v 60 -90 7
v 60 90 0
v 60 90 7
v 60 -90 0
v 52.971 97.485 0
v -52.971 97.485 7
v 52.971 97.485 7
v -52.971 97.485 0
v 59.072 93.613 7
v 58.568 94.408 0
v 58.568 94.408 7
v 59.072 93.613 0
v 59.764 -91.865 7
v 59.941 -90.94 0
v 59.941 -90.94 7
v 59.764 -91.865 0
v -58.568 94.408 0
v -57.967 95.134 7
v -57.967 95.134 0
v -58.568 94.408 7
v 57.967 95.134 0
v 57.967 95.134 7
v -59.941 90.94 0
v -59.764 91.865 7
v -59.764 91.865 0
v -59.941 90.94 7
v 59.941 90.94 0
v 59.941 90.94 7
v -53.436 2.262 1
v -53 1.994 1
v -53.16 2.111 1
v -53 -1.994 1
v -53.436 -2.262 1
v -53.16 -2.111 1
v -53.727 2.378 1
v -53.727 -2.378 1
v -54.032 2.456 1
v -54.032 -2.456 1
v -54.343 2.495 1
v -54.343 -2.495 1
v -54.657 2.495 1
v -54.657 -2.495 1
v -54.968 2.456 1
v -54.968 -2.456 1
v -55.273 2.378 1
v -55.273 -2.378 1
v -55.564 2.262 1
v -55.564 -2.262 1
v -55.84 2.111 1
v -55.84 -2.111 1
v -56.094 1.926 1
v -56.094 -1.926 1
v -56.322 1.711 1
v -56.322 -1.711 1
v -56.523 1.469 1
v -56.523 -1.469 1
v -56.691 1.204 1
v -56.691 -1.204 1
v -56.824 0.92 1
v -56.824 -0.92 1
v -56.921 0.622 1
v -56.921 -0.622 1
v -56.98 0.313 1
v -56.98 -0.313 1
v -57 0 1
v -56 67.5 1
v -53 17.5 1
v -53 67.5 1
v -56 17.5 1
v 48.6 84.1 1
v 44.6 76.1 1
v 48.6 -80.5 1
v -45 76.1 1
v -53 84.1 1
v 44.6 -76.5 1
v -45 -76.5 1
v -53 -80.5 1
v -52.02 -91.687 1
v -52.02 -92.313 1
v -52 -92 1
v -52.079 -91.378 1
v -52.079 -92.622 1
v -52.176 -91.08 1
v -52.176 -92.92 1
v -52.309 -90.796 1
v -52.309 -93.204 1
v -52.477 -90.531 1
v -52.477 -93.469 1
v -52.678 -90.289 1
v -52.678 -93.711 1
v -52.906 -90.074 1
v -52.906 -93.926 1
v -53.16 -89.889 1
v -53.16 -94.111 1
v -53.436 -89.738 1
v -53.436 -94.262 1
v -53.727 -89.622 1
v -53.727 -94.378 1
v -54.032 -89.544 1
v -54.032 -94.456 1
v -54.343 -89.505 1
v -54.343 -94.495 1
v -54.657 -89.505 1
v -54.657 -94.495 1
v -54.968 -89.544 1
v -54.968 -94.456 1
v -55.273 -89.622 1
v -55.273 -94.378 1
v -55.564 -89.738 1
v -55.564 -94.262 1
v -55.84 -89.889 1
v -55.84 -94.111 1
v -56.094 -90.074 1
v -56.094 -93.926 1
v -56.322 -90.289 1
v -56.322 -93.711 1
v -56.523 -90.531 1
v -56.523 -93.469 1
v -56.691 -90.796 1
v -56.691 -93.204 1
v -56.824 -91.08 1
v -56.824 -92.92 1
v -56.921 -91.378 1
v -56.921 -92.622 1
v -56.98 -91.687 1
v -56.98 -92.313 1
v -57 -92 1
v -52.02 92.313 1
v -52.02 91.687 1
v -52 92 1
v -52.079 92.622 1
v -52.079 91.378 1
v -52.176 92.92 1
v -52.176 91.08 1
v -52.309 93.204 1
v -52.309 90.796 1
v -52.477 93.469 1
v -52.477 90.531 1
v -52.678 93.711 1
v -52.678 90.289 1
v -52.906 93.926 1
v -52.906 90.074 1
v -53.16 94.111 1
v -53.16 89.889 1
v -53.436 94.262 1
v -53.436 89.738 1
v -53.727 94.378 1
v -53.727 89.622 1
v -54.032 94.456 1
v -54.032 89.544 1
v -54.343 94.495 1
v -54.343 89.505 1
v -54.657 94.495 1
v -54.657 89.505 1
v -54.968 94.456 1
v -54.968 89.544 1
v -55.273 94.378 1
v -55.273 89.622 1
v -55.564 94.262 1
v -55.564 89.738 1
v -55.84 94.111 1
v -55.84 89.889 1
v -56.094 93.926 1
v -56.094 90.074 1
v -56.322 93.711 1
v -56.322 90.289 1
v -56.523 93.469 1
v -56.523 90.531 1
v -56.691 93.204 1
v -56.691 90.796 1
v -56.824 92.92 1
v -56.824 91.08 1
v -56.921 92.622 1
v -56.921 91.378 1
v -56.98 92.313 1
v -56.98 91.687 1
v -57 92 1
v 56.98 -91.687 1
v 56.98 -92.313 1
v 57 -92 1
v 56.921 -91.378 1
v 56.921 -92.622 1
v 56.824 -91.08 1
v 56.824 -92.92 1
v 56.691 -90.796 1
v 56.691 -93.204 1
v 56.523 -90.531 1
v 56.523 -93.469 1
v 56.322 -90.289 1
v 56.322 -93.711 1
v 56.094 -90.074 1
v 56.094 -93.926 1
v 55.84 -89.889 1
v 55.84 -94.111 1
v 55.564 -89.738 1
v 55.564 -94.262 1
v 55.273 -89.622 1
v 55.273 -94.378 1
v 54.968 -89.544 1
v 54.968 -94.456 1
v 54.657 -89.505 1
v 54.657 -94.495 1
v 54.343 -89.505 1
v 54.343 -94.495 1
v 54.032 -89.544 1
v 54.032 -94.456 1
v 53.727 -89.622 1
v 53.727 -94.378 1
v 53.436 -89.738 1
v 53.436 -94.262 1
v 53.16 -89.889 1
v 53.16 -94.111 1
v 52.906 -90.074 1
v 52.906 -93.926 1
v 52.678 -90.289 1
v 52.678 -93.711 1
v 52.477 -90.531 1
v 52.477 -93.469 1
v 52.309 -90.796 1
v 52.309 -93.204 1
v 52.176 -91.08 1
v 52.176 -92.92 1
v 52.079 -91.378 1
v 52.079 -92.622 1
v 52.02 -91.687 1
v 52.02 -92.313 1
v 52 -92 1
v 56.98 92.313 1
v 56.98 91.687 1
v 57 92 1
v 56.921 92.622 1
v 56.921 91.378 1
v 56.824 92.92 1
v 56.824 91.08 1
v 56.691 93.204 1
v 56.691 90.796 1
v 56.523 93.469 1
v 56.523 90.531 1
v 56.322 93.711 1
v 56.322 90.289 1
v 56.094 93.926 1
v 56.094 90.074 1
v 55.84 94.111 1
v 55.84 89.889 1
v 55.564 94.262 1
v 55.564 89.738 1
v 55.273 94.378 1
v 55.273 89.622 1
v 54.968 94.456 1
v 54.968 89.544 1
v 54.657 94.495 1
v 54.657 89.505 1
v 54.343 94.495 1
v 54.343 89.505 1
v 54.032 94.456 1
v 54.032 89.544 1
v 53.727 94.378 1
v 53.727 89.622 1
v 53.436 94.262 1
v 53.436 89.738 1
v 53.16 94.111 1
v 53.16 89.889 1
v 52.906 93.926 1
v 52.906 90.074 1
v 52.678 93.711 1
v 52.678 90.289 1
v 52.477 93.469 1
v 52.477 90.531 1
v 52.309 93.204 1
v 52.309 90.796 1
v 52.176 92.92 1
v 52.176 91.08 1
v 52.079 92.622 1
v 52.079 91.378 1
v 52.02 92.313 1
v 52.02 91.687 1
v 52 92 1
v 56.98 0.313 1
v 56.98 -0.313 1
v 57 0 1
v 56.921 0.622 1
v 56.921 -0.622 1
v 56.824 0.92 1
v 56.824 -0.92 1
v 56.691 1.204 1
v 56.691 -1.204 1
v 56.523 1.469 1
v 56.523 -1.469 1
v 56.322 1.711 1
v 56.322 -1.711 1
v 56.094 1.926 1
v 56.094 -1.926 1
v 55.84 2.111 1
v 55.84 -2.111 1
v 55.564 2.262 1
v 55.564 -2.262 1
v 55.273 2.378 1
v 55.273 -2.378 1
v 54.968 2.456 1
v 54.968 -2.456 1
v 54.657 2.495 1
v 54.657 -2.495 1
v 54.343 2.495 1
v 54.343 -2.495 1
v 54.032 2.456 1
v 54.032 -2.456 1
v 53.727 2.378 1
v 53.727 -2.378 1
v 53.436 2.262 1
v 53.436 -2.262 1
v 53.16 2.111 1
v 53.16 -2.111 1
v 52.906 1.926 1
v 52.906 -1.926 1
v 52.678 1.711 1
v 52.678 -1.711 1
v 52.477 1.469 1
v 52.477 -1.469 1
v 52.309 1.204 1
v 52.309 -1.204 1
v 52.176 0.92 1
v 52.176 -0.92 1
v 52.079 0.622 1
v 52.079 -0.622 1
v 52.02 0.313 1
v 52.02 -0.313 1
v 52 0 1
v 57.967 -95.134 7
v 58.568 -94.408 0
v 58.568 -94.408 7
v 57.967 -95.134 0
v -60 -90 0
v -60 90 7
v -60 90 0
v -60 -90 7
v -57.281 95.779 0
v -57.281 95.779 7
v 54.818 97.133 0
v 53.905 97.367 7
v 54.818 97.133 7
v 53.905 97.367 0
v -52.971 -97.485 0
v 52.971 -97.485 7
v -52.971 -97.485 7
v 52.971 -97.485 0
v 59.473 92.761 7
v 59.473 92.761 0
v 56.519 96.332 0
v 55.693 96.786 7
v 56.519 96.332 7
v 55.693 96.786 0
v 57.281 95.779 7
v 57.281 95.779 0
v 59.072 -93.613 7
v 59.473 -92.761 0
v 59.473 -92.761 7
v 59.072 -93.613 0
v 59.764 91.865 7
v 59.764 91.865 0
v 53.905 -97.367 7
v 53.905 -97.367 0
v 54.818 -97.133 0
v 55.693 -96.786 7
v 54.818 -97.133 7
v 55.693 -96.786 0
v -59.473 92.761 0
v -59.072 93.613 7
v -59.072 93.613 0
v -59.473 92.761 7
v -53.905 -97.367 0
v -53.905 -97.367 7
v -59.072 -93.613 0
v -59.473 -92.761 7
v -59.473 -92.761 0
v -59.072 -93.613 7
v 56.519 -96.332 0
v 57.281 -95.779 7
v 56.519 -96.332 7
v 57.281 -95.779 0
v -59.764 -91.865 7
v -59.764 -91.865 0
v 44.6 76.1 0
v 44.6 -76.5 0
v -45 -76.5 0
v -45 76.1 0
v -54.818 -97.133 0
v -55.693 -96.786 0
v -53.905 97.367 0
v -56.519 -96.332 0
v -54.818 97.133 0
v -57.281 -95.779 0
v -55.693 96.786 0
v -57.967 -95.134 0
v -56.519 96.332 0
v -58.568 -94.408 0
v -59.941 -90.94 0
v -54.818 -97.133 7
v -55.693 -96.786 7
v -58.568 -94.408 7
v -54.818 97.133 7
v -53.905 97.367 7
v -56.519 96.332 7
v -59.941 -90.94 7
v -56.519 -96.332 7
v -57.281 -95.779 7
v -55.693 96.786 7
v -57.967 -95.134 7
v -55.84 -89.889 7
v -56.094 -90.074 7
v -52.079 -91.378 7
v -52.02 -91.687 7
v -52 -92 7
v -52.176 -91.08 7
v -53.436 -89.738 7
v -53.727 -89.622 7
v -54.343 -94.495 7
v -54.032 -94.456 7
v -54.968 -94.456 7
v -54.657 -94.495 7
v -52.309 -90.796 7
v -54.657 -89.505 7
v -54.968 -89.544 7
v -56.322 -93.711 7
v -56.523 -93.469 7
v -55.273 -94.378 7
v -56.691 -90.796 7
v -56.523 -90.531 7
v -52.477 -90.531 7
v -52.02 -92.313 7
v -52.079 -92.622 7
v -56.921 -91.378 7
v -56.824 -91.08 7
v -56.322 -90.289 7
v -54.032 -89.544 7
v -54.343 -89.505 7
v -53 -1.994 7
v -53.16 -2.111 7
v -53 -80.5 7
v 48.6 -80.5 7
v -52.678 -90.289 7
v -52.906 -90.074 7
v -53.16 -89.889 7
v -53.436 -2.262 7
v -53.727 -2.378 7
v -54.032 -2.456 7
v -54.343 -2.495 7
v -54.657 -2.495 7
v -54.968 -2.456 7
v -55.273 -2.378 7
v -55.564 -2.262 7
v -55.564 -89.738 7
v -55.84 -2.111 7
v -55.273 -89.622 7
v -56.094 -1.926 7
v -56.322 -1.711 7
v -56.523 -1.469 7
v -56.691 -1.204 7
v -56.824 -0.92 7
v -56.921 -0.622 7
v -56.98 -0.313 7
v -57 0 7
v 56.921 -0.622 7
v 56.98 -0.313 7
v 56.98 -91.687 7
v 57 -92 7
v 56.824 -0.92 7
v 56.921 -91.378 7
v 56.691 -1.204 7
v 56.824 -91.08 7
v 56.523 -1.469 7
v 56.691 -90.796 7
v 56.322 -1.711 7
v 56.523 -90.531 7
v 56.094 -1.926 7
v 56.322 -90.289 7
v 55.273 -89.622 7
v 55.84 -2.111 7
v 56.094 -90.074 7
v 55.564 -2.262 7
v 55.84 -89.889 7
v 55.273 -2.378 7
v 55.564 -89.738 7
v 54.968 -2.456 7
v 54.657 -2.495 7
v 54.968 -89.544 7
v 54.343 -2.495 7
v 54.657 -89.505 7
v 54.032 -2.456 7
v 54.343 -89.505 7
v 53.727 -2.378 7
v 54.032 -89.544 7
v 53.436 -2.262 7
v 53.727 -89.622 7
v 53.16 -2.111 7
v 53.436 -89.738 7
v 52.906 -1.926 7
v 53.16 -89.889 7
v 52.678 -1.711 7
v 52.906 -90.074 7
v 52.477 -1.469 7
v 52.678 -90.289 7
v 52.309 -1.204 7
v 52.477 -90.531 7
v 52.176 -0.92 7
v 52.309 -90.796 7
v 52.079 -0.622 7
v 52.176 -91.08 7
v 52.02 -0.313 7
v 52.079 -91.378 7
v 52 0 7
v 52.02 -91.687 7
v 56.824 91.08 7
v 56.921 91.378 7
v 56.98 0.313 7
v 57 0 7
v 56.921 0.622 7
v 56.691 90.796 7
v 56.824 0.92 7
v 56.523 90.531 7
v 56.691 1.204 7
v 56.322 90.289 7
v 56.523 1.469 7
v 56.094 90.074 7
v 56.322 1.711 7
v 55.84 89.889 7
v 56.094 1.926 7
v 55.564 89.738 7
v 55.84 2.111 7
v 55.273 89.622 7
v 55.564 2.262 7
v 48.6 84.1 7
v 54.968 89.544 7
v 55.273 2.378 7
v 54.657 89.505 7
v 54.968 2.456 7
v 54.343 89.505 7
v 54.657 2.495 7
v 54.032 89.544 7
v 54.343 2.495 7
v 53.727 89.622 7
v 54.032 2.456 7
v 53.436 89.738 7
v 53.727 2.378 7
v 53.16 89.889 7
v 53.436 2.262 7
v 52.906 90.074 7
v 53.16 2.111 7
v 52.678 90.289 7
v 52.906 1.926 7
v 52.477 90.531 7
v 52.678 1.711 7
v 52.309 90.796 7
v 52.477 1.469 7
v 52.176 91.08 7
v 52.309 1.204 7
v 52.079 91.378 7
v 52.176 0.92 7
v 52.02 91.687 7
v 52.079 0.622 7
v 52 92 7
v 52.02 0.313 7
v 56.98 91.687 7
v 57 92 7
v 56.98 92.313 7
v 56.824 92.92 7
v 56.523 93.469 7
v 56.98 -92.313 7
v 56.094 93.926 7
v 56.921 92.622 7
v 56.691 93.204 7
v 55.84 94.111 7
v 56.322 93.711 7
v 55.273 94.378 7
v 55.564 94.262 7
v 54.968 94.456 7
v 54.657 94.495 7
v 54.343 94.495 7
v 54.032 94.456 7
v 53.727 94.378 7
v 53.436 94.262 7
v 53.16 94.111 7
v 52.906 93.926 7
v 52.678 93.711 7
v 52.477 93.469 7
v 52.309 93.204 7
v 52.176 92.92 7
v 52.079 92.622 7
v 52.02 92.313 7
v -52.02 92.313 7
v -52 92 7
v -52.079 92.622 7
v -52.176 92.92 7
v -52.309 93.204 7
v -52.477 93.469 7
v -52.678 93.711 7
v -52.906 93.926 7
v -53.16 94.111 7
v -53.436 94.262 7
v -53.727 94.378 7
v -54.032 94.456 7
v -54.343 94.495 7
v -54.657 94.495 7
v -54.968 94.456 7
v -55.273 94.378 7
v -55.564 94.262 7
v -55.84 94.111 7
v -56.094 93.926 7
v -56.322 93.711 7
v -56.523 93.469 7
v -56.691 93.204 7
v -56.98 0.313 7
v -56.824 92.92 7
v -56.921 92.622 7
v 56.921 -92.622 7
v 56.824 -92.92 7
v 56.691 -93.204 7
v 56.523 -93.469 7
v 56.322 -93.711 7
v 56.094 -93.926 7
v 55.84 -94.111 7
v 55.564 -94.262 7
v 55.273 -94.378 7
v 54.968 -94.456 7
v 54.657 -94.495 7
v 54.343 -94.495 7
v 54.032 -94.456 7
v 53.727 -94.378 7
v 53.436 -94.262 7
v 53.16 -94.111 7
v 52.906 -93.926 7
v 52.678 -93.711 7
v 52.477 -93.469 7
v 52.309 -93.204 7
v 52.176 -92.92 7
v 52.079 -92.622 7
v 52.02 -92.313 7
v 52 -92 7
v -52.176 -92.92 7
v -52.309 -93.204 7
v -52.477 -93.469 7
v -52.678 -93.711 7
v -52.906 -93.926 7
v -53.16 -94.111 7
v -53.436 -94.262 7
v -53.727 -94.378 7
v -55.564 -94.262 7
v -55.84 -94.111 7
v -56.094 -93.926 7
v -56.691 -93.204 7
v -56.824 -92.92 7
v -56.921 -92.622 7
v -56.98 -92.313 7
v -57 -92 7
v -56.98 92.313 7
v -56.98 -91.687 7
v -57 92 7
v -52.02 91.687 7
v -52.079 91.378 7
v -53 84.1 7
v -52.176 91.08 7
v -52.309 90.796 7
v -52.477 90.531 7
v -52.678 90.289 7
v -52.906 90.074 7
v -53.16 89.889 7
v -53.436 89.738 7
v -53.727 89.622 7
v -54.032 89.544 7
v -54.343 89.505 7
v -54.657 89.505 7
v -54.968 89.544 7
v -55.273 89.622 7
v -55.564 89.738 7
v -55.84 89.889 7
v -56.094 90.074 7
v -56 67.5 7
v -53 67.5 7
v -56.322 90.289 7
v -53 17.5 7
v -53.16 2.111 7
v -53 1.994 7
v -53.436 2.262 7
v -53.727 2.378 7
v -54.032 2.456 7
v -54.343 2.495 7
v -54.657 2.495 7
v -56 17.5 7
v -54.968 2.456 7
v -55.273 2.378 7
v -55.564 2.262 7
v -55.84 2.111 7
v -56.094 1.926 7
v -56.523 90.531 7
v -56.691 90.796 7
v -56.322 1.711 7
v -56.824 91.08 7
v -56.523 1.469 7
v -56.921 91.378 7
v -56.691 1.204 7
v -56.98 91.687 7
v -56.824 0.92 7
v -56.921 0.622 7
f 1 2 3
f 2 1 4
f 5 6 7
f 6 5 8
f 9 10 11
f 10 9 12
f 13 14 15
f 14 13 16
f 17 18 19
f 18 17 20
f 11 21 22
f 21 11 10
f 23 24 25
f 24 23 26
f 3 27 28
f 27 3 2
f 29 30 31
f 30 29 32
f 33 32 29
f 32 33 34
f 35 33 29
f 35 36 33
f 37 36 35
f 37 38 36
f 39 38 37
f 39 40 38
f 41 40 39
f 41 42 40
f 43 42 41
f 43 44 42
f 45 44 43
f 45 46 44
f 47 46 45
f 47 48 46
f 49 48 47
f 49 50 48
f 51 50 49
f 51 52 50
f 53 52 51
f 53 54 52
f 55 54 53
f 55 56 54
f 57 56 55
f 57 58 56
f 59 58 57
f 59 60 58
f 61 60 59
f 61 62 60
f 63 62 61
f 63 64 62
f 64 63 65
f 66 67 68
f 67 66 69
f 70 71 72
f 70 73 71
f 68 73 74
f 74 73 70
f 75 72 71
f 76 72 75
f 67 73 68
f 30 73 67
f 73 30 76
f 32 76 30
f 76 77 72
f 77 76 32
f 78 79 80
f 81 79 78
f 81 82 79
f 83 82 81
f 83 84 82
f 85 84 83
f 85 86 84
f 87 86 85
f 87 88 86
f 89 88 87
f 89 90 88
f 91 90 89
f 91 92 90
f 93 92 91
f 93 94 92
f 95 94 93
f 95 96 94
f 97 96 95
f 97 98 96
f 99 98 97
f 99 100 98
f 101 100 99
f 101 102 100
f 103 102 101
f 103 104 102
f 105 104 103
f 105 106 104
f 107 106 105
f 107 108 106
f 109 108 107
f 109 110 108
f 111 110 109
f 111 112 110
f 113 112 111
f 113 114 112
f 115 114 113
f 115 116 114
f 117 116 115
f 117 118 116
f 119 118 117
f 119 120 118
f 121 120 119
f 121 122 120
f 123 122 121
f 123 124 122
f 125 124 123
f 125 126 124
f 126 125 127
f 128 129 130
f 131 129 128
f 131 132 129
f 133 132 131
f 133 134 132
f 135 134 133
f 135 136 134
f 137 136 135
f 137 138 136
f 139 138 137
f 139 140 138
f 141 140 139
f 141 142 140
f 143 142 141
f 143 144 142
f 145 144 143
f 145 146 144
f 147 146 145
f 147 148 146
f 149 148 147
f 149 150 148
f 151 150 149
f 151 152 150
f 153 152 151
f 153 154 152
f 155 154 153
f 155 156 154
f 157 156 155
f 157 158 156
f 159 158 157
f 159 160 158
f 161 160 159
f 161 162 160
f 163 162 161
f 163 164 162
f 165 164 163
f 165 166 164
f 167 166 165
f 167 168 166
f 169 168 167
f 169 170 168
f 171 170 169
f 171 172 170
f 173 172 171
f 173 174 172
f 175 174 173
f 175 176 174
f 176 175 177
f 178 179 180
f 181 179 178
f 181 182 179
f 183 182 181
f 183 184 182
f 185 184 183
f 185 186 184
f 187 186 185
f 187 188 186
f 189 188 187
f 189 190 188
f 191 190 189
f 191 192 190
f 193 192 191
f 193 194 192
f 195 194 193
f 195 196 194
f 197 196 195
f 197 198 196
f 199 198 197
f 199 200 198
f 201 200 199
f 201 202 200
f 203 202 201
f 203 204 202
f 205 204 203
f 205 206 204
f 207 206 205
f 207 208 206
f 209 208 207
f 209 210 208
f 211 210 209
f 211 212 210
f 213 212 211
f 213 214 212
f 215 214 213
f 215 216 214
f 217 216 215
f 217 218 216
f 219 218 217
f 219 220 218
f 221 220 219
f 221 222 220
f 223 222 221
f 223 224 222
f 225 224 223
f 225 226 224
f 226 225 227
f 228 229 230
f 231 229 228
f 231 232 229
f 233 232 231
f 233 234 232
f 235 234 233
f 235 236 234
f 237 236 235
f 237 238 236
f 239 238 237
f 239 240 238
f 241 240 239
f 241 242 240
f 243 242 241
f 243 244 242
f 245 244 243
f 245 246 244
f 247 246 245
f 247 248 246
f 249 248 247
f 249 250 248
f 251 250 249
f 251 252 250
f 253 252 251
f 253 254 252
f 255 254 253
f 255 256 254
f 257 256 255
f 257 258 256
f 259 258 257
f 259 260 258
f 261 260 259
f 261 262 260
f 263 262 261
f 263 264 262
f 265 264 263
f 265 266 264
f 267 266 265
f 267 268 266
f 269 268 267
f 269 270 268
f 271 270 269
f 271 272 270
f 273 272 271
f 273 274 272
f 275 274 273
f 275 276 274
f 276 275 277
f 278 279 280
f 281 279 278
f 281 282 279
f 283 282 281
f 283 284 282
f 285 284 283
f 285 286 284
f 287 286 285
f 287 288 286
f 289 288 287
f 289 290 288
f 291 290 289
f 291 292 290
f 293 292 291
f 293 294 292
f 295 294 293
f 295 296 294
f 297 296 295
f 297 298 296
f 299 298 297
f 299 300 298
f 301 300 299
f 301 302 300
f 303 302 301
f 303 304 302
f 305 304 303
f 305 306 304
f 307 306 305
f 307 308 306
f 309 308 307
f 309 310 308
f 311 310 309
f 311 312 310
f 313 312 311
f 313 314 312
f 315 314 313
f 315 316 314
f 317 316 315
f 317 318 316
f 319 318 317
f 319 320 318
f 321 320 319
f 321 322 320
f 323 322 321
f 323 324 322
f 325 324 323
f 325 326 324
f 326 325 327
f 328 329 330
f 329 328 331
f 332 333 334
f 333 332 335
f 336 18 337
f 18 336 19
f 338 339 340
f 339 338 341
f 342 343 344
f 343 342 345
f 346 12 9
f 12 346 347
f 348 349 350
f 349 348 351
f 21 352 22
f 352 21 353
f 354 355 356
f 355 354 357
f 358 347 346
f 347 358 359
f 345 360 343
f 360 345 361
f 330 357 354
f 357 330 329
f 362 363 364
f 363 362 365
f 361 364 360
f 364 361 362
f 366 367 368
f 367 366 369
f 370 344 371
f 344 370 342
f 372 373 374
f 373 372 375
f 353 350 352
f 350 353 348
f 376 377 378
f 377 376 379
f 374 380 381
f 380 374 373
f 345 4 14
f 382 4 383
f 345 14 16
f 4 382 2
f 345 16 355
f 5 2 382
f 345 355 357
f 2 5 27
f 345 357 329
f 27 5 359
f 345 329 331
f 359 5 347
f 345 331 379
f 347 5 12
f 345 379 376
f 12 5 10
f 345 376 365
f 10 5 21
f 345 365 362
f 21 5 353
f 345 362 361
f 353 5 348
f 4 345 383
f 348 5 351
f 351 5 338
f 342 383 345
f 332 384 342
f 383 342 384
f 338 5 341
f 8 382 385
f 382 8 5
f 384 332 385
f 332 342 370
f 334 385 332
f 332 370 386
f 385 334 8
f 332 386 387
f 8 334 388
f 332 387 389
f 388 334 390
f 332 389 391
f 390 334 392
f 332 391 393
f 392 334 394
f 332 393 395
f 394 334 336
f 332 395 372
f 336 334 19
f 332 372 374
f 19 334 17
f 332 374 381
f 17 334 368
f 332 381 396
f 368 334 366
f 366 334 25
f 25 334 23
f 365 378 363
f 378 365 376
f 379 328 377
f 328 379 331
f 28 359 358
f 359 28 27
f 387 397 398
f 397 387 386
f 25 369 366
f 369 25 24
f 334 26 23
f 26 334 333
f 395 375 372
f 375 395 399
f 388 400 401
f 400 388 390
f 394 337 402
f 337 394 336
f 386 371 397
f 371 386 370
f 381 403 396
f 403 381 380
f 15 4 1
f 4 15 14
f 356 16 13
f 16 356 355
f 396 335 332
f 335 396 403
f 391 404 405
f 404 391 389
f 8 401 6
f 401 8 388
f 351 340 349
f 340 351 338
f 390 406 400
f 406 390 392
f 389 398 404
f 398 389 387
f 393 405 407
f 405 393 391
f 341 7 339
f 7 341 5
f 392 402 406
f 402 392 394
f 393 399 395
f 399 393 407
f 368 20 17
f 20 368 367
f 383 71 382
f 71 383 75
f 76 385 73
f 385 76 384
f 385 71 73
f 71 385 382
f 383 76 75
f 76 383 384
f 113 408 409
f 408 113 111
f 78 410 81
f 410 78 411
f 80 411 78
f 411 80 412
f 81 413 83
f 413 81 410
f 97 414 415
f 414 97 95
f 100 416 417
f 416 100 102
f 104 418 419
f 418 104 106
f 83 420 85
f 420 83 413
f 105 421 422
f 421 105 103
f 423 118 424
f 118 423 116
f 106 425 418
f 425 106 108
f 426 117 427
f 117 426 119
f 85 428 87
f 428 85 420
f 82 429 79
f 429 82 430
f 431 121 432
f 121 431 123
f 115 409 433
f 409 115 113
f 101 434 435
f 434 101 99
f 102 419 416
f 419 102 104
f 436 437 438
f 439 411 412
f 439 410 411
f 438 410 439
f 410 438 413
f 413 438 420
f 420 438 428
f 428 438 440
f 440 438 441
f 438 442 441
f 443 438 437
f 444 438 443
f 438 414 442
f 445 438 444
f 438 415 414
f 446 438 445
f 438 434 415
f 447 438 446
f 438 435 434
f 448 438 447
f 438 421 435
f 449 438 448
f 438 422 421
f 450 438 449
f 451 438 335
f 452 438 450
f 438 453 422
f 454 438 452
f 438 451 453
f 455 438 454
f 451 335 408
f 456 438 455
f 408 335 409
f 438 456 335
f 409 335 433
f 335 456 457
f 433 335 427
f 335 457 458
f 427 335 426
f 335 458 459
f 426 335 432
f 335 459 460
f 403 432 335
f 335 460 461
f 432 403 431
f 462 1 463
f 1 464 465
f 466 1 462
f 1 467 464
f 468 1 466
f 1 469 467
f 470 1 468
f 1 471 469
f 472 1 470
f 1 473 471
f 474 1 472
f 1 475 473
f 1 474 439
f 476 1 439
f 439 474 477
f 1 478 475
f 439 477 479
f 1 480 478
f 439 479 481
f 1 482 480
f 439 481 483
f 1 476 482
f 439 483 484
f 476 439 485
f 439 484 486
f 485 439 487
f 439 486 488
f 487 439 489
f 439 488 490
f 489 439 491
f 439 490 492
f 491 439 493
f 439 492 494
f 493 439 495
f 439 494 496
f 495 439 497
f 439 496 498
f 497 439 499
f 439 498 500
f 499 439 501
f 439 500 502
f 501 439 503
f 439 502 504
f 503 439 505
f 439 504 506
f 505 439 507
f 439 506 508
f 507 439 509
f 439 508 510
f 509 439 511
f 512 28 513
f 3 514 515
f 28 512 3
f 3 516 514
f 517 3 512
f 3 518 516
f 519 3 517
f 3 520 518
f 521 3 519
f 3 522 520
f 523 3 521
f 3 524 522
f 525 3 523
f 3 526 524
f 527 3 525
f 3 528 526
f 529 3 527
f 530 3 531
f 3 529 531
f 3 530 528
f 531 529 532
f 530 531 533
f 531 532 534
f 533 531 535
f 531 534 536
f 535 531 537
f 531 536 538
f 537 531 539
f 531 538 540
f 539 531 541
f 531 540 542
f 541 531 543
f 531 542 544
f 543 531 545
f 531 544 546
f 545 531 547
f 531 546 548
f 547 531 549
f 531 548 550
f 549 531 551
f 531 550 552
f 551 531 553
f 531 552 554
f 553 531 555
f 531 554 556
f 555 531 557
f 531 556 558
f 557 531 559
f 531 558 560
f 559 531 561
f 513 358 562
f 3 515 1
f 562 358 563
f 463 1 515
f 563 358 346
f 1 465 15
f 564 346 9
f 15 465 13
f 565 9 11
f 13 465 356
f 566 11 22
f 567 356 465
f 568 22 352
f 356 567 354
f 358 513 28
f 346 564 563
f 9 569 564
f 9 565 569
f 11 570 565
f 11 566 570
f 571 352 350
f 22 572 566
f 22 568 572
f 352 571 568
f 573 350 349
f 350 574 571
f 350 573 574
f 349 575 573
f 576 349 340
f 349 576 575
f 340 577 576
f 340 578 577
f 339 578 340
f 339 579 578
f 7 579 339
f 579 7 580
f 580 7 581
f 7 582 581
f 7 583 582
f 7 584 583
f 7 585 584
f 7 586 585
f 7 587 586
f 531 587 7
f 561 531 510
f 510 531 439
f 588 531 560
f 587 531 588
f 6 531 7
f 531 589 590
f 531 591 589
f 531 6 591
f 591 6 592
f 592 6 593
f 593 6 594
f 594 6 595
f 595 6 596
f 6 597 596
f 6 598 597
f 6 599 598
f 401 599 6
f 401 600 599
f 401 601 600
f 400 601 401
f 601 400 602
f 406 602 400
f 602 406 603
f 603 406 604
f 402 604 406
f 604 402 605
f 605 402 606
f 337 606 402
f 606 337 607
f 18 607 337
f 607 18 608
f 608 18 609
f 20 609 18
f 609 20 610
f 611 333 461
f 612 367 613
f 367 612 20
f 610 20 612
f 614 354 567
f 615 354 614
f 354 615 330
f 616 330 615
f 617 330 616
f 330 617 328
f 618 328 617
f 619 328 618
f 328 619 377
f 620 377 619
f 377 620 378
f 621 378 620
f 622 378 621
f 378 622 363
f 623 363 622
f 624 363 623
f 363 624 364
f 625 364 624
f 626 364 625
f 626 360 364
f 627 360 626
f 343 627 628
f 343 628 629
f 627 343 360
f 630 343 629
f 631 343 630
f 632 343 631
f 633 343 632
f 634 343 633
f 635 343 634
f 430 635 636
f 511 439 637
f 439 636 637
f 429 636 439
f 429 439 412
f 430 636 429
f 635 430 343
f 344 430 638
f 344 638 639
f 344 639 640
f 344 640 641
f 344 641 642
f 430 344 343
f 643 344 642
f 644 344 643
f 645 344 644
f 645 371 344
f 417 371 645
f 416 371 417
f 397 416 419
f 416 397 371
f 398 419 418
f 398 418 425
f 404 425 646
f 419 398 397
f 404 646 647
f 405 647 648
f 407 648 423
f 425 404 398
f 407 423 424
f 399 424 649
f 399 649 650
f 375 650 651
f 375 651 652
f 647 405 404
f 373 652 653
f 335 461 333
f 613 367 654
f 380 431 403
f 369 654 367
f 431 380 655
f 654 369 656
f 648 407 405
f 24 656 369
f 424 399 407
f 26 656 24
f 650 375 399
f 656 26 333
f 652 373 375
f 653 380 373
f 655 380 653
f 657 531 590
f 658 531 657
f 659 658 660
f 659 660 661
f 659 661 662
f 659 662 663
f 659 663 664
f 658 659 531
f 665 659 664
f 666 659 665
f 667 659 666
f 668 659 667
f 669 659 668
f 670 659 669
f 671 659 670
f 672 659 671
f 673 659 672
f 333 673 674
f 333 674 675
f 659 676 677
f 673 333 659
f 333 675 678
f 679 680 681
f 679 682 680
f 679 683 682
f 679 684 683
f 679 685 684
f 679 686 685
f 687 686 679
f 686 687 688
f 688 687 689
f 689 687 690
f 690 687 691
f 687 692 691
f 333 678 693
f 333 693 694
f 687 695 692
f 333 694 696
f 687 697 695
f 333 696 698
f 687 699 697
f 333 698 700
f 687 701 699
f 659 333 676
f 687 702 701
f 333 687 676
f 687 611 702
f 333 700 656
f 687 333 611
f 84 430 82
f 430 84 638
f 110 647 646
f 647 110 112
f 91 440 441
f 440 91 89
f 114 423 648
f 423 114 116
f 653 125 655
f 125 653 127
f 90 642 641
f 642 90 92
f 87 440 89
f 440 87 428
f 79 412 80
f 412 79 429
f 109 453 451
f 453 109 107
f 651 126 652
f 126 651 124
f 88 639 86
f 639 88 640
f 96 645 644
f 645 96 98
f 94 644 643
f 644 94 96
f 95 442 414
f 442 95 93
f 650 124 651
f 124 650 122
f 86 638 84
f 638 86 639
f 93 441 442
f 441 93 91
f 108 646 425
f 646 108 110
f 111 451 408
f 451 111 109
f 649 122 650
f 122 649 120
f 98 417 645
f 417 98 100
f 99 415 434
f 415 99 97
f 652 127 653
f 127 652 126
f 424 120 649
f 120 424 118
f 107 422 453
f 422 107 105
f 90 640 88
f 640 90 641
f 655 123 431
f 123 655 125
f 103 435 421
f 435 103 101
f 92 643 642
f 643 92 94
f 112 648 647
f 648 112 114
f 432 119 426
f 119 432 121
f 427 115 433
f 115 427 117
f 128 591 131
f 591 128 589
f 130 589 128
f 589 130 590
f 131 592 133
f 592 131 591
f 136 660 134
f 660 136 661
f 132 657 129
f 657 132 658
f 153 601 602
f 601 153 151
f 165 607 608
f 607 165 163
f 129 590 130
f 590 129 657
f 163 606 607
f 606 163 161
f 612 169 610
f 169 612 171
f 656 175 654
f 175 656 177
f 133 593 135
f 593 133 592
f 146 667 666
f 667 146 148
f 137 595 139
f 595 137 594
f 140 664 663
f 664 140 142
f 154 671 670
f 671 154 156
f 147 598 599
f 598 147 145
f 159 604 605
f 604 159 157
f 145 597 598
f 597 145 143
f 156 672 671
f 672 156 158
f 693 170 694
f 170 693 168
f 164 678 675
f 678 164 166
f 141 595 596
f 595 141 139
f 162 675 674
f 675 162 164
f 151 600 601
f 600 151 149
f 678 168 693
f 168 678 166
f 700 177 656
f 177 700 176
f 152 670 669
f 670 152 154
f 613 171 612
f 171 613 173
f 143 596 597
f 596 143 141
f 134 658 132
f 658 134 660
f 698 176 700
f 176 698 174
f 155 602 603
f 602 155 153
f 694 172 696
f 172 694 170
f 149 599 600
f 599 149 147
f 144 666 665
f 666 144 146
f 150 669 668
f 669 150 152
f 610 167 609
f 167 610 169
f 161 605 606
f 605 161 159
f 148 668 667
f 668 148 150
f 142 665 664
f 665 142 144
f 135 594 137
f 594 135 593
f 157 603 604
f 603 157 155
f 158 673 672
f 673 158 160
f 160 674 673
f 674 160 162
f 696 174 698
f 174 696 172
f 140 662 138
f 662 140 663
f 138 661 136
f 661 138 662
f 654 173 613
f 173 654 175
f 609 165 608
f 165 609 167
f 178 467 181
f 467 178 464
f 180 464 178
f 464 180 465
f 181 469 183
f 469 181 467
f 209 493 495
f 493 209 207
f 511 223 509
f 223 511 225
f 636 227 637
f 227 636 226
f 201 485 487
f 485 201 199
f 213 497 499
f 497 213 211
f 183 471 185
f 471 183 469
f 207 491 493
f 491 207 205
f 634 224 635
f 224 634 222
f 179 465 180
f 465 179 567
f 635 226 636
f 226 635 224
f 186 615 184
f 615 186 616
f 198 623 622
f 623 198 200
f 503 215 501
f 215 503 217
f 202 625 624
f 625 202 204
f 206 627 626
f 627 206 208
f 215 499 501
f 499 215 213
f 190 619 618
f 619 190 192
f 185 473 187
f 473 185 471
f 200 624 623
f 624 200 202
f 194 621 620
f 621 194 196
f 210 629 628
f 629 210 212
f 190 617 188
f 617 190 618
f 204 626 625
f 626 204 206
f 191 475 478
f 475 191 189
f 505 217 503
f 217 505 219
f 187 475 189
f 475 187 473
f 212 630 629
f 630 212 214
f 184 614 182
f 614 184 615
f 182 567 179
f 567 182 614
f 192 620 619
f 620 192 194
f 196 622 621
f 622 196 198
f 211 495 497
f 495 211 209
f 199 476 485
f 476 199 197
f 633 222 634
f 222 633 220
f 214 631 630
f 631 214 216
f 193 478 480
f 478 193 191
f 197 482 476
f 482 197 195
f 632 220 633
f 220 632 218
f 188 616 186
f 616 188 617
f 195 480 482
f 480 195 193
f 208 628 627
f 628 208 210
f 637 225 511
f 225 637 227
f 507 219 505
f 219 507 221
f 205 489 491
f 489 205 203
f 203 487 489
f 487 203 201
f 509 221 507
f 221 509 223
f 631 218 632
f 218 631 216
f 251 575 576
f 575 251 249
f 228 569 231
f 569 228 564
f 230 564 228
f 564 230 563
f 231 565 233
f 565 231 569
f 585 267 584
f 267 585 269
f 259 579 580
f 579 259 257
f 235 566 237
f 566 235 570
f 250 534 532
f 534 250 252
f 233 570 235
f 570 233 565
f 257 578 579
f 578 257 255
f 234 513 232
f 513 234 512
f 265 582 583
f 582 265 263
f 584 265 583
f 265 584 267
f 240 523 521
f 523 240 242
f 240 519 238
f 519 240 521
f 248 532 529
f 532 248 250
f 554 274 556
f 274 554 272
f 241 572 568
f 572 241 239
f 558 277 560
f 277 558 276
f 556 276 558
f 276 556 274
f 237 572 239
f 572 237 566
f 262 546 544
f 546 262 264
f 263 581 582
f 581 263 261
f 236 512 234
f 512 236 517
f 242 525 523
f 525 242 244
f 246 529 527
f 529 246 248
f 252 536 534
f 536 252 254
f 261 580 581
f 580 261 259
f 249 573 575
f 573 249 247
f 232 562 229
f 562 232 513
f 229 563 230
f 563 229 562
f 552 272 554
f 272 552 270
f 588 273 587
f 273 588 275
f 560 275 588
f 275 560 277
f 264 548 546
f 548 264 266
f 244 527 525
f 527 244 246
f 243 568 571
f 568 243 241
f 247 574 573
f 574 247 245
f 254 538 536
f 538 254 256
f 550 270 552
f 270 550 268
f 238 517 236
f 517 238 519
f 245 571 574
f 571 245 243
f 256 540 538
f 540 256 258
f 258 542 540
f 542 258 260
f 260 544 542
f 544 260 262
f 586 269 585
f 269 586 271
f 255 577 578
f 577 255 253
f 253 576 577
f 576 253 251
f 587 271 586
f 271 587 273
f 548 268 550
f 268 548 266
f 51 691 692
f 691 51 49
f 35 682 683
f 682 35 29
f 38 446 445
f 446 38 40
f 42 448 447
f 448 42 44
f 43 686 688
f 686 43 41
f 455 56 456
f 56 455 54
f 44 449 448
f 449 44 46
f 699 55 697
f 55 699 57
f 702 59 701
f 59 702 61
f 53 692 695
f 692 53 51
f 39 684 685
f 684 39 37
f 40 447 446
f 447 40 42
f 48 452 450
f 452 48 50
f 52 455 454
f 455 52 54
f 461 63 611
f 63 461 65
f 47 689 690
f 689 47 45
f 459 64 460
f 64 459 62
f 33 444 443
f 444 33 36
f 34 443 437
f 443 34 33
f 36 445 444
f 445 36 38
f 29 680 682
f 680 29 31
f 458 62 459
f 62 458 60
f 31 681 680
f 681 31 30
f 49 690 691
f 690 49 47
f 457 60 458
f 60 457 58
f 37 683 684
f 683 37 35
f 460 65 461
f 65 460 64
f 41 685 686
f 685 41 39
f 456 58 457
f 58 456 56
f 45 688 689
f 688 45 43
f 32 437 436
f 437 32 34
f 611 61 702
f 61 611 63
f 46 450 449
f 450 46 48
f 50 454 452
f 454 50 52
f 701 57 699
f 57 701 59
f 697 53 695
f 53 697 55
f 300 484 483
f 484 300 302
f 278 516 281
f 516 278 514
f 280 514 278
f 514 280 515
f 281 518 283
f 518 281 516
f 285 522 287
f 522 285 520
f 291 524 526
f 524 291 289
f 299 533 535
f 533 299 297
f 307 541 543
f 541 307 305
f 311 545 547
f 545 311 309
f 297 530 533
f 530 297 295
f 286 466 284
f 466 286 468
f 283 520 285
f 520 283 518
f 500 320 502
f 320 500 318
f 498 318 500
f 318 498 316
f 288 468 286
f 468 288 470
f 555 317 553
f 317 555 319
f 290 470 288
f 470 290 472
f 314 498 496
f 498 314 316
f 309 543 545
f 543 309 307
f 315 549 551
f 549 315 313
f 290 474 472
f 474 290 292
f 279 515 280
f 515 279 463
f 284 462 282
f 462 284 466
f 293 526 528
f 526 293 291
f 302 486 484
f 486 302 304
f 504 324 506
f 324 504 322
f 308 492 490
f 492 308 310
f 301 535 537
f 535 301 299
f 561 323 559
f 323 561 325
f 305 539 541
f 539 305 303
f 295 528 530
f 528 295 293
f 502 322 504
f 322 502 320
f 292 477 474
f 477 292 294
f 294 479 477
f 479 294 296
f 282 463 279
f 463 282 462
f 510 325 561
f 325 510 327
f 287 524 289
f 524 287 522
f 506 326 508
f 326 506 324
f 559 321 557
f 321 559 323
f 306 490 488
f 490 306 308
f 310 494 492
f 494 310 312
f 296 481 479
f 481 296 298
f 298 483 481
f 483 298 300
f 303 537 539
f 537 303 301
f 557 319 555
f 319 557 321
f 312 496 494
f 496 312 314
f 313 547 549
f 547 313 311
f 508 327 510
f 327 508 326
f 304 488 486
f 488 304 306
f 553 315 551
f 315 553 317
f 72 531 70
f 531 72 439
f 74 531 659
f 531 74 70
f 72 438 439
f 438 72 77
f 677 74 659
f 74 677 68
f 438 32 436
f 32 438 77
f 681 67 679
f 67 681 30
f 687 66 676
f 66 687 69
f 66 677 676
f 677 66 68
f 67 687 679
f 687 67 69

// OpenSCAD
FRONT_THICKNESS = 1;
WALL_THICKNESS = 2;
MIDDLE_HEIGHT = 6;
FRONT_HEIGHT = 1;
BACK_HEIGHT = 2;

WIDTH = 120;
LENGTH = 195;
CORNER_DIA = 15;

TOUCHSCREEN_WIDTH = 99.6;
TOUCHSCREEN_LENGTH = 164.6;
TOUCHSCREEN_OFFSET_X = 7 - (WIDTH - TOUCHSCREEN_WIDTH)/2;
TOUCHSCREEN_OFFSET_Y = 17 - (LENGTH - TOUCHSCREEN_LENGTH)/2;
TOUCHSCREEN_RIBBON_WIDTH = 3;
TOUCHSCREEN_RIBBON_LENGTH = 50;
TOUCHSCREEN_RIBBON_OFFSET_X = 4 - (WIDTH - TOUCHSCREEN_RIBBON_WIDTH)/2;
TOUCHSCREEN_RIBBON_OFFSET_Y = 115 - (LENGTH - TOUCHSCREEN_RIBBON_LENGTH)/2;

DISPLAY_WIDTH = 96.6;
DISPLAY_LENGTH = 164.6;
DISPLAY_OFFSET_X = 12 - (WIDTH - DISPLAY_WIDTH)/2;
DISPLAY_OFFSET_Y = 17 - (LENGTH - DISPLAY_LENGTH)/2;
DISPLAY_RIBBON_WIDTH = 5;
DISPLAY_RIBBON_LENGTH = 40;
DISPLAY_RIBBON_OFFSET_X = 90 - (WIDTH - DISPLAY_RIBBON_WIDTH)/2;
DISPLAY_RIBBON_OFFSET_Y = 78 - (LENGTH - DISPLAY_RIBBON_LENGTH)/2;

PORT_WIDTH = 89.6;
PORT_LENGTH = 152.6;
PORT_OFFSET_X = 21 - (LENGTH - PORT_LENGTH)/2;
PORT_OFFSET_Y = 15 - (WIDTH - PORT_WIDTH)/2;

MOUNT_HOLE_DIA = 4;
MOUNT_HOLE_INSERT_DIA = 5;
MOUNT_HOLE_SPACING_X = 109;
MOUNT_HOLE_SPACING_Y = 184;

CONTROLLER_HOLE_DIA = 4;
CONTROLLER_HOLE_SPACING_X = 78;
CONTROLLER_HOLE_SPACING_Y = 115;


FRONT_HOLES = false;

$fn = 50;

module holes(w, l, h, dia) {
  for(i = [-1, 1]) {
    for(j = [-1, 1]) {
      translate([i * w/2, j * l/2, 0])
      cylinder(d = dia, h = h);
    }
  }
}

module rounded_rect(w, l, h, dia) {
    hull()
    holes(w - dia, l - dia, h, dia);
}

module port(w, l, h) {
  translate([-w/2, -l/2, 0])
  cube(size = [w, l, h]);
}

module front() {
  difference() {
    rounded_rect(WIDTH, LENGTH, FRONT_HEIGHT, CORNER_DIA);

    #translate([PORT_OFFSET_X, PORT_OFFSET_Y, 0])
    port(PORT_WIDTH, PORT_LENGTH, FRONT_HEIGHT);

    if(FRONT_HOLES) {
      #holes(MOUNT_HOLE_SPACING_X, MOUNT_HOLE_SPACING_Y, FRONT_HEIGHT, MOUNT_HOLE_DIA);
      #holes(MOUNT_HOLE_SPACING_X, 0, FRONT_HEIGHT, MOUNT_HOLE_DIA);
    }
  }
}

module middle() {
  difference() {
    rounded_rect(WIDTH, LENGTH, MIDDLE_HEIGHT, CORNER_DIA);

    #translate([DISPLAY_OFFSET_X, DISPLAY_OFFSET_Y, 0])
    port(DISPLAY_WIDTH, DISPLAY_LENGTH, MIDDLE_HEIGHT);

    #translate([TOUCHSCREEN_OFFSET_X, TOUCHSCREEN_OFFSET_Y, 0])
    port(TOUCHSCREEN_WIDTH, TOUCHSCREEN_LENGTH, MIDDLE_HEIGHT);

    #translate([TOUCHSCREEN_RIBBON_OFFSET_X, TOUCHSCREEN_RIBBON_OFFSET_Y, 0])
    port(TOUCHSCREEN_RIBBON_WIDTH, TOUCHSCREEN_RIBBON_LENGTH, MIDDLE_HEIGHT);

    #holes(MOUNT_HOLE_SPACING_X, MOUNT_HOLE_SPACING_Y, MIDDLE_HEIGHT, MOUNT_HOLE_INSERT_DIA);
    #holes(MOUNT_HOLE_SPACING_X, 0, MIDDLE_HEIGHT, MOUNT_HOLE_INSERT_DIA);
  }
}

module back() {
  difference() {
    rounded_rect(WIDTH, LENGTH, BACK_HEIGHT, CORNER_DIA);

    #translate([TOUCHSCREEN_RIBBON_OFFSET_X, TOUCHSCREEN_RIBBON_OFFSET_Y, 0])
    port(TOUCHSCREEN_RIBBON_WIDTH, TOUCHSCREEN_RIBBON_LENGTH, BACK_HEIGHT);

    #translate([DISPLAY_RIBBON_OFFSET_X, DISPLAY_RIBBON_OFFSET_Y, 0])
    port(DISPLAY_RIBBON_WIDTH, DISPLAY_RIBBON_LENGTH, BACK_HEIGHT);

    #holes(MOUNT_HOLE_SPACING_X, MOUNT_HOLE_SPACING_Y, BACK_HEIGHT, MOUNT_HOLE_DIA);
    #holes(MOUNT_HOLE_SPACING_X, 0, BACK_HEIGHT, MOUNT_HOLE_DIA);

    #holes(CONTROLLER_HOLE_SPACING_X, CONTROLLER_HOLE_SPACING_Y, BACK_HEIGHT, CONTROLLER_HOLE_DIA);
  }
}

!union() {
  front();
  translate([0, 0, FRONT_HEIGHT])
  middle();
}

back();
